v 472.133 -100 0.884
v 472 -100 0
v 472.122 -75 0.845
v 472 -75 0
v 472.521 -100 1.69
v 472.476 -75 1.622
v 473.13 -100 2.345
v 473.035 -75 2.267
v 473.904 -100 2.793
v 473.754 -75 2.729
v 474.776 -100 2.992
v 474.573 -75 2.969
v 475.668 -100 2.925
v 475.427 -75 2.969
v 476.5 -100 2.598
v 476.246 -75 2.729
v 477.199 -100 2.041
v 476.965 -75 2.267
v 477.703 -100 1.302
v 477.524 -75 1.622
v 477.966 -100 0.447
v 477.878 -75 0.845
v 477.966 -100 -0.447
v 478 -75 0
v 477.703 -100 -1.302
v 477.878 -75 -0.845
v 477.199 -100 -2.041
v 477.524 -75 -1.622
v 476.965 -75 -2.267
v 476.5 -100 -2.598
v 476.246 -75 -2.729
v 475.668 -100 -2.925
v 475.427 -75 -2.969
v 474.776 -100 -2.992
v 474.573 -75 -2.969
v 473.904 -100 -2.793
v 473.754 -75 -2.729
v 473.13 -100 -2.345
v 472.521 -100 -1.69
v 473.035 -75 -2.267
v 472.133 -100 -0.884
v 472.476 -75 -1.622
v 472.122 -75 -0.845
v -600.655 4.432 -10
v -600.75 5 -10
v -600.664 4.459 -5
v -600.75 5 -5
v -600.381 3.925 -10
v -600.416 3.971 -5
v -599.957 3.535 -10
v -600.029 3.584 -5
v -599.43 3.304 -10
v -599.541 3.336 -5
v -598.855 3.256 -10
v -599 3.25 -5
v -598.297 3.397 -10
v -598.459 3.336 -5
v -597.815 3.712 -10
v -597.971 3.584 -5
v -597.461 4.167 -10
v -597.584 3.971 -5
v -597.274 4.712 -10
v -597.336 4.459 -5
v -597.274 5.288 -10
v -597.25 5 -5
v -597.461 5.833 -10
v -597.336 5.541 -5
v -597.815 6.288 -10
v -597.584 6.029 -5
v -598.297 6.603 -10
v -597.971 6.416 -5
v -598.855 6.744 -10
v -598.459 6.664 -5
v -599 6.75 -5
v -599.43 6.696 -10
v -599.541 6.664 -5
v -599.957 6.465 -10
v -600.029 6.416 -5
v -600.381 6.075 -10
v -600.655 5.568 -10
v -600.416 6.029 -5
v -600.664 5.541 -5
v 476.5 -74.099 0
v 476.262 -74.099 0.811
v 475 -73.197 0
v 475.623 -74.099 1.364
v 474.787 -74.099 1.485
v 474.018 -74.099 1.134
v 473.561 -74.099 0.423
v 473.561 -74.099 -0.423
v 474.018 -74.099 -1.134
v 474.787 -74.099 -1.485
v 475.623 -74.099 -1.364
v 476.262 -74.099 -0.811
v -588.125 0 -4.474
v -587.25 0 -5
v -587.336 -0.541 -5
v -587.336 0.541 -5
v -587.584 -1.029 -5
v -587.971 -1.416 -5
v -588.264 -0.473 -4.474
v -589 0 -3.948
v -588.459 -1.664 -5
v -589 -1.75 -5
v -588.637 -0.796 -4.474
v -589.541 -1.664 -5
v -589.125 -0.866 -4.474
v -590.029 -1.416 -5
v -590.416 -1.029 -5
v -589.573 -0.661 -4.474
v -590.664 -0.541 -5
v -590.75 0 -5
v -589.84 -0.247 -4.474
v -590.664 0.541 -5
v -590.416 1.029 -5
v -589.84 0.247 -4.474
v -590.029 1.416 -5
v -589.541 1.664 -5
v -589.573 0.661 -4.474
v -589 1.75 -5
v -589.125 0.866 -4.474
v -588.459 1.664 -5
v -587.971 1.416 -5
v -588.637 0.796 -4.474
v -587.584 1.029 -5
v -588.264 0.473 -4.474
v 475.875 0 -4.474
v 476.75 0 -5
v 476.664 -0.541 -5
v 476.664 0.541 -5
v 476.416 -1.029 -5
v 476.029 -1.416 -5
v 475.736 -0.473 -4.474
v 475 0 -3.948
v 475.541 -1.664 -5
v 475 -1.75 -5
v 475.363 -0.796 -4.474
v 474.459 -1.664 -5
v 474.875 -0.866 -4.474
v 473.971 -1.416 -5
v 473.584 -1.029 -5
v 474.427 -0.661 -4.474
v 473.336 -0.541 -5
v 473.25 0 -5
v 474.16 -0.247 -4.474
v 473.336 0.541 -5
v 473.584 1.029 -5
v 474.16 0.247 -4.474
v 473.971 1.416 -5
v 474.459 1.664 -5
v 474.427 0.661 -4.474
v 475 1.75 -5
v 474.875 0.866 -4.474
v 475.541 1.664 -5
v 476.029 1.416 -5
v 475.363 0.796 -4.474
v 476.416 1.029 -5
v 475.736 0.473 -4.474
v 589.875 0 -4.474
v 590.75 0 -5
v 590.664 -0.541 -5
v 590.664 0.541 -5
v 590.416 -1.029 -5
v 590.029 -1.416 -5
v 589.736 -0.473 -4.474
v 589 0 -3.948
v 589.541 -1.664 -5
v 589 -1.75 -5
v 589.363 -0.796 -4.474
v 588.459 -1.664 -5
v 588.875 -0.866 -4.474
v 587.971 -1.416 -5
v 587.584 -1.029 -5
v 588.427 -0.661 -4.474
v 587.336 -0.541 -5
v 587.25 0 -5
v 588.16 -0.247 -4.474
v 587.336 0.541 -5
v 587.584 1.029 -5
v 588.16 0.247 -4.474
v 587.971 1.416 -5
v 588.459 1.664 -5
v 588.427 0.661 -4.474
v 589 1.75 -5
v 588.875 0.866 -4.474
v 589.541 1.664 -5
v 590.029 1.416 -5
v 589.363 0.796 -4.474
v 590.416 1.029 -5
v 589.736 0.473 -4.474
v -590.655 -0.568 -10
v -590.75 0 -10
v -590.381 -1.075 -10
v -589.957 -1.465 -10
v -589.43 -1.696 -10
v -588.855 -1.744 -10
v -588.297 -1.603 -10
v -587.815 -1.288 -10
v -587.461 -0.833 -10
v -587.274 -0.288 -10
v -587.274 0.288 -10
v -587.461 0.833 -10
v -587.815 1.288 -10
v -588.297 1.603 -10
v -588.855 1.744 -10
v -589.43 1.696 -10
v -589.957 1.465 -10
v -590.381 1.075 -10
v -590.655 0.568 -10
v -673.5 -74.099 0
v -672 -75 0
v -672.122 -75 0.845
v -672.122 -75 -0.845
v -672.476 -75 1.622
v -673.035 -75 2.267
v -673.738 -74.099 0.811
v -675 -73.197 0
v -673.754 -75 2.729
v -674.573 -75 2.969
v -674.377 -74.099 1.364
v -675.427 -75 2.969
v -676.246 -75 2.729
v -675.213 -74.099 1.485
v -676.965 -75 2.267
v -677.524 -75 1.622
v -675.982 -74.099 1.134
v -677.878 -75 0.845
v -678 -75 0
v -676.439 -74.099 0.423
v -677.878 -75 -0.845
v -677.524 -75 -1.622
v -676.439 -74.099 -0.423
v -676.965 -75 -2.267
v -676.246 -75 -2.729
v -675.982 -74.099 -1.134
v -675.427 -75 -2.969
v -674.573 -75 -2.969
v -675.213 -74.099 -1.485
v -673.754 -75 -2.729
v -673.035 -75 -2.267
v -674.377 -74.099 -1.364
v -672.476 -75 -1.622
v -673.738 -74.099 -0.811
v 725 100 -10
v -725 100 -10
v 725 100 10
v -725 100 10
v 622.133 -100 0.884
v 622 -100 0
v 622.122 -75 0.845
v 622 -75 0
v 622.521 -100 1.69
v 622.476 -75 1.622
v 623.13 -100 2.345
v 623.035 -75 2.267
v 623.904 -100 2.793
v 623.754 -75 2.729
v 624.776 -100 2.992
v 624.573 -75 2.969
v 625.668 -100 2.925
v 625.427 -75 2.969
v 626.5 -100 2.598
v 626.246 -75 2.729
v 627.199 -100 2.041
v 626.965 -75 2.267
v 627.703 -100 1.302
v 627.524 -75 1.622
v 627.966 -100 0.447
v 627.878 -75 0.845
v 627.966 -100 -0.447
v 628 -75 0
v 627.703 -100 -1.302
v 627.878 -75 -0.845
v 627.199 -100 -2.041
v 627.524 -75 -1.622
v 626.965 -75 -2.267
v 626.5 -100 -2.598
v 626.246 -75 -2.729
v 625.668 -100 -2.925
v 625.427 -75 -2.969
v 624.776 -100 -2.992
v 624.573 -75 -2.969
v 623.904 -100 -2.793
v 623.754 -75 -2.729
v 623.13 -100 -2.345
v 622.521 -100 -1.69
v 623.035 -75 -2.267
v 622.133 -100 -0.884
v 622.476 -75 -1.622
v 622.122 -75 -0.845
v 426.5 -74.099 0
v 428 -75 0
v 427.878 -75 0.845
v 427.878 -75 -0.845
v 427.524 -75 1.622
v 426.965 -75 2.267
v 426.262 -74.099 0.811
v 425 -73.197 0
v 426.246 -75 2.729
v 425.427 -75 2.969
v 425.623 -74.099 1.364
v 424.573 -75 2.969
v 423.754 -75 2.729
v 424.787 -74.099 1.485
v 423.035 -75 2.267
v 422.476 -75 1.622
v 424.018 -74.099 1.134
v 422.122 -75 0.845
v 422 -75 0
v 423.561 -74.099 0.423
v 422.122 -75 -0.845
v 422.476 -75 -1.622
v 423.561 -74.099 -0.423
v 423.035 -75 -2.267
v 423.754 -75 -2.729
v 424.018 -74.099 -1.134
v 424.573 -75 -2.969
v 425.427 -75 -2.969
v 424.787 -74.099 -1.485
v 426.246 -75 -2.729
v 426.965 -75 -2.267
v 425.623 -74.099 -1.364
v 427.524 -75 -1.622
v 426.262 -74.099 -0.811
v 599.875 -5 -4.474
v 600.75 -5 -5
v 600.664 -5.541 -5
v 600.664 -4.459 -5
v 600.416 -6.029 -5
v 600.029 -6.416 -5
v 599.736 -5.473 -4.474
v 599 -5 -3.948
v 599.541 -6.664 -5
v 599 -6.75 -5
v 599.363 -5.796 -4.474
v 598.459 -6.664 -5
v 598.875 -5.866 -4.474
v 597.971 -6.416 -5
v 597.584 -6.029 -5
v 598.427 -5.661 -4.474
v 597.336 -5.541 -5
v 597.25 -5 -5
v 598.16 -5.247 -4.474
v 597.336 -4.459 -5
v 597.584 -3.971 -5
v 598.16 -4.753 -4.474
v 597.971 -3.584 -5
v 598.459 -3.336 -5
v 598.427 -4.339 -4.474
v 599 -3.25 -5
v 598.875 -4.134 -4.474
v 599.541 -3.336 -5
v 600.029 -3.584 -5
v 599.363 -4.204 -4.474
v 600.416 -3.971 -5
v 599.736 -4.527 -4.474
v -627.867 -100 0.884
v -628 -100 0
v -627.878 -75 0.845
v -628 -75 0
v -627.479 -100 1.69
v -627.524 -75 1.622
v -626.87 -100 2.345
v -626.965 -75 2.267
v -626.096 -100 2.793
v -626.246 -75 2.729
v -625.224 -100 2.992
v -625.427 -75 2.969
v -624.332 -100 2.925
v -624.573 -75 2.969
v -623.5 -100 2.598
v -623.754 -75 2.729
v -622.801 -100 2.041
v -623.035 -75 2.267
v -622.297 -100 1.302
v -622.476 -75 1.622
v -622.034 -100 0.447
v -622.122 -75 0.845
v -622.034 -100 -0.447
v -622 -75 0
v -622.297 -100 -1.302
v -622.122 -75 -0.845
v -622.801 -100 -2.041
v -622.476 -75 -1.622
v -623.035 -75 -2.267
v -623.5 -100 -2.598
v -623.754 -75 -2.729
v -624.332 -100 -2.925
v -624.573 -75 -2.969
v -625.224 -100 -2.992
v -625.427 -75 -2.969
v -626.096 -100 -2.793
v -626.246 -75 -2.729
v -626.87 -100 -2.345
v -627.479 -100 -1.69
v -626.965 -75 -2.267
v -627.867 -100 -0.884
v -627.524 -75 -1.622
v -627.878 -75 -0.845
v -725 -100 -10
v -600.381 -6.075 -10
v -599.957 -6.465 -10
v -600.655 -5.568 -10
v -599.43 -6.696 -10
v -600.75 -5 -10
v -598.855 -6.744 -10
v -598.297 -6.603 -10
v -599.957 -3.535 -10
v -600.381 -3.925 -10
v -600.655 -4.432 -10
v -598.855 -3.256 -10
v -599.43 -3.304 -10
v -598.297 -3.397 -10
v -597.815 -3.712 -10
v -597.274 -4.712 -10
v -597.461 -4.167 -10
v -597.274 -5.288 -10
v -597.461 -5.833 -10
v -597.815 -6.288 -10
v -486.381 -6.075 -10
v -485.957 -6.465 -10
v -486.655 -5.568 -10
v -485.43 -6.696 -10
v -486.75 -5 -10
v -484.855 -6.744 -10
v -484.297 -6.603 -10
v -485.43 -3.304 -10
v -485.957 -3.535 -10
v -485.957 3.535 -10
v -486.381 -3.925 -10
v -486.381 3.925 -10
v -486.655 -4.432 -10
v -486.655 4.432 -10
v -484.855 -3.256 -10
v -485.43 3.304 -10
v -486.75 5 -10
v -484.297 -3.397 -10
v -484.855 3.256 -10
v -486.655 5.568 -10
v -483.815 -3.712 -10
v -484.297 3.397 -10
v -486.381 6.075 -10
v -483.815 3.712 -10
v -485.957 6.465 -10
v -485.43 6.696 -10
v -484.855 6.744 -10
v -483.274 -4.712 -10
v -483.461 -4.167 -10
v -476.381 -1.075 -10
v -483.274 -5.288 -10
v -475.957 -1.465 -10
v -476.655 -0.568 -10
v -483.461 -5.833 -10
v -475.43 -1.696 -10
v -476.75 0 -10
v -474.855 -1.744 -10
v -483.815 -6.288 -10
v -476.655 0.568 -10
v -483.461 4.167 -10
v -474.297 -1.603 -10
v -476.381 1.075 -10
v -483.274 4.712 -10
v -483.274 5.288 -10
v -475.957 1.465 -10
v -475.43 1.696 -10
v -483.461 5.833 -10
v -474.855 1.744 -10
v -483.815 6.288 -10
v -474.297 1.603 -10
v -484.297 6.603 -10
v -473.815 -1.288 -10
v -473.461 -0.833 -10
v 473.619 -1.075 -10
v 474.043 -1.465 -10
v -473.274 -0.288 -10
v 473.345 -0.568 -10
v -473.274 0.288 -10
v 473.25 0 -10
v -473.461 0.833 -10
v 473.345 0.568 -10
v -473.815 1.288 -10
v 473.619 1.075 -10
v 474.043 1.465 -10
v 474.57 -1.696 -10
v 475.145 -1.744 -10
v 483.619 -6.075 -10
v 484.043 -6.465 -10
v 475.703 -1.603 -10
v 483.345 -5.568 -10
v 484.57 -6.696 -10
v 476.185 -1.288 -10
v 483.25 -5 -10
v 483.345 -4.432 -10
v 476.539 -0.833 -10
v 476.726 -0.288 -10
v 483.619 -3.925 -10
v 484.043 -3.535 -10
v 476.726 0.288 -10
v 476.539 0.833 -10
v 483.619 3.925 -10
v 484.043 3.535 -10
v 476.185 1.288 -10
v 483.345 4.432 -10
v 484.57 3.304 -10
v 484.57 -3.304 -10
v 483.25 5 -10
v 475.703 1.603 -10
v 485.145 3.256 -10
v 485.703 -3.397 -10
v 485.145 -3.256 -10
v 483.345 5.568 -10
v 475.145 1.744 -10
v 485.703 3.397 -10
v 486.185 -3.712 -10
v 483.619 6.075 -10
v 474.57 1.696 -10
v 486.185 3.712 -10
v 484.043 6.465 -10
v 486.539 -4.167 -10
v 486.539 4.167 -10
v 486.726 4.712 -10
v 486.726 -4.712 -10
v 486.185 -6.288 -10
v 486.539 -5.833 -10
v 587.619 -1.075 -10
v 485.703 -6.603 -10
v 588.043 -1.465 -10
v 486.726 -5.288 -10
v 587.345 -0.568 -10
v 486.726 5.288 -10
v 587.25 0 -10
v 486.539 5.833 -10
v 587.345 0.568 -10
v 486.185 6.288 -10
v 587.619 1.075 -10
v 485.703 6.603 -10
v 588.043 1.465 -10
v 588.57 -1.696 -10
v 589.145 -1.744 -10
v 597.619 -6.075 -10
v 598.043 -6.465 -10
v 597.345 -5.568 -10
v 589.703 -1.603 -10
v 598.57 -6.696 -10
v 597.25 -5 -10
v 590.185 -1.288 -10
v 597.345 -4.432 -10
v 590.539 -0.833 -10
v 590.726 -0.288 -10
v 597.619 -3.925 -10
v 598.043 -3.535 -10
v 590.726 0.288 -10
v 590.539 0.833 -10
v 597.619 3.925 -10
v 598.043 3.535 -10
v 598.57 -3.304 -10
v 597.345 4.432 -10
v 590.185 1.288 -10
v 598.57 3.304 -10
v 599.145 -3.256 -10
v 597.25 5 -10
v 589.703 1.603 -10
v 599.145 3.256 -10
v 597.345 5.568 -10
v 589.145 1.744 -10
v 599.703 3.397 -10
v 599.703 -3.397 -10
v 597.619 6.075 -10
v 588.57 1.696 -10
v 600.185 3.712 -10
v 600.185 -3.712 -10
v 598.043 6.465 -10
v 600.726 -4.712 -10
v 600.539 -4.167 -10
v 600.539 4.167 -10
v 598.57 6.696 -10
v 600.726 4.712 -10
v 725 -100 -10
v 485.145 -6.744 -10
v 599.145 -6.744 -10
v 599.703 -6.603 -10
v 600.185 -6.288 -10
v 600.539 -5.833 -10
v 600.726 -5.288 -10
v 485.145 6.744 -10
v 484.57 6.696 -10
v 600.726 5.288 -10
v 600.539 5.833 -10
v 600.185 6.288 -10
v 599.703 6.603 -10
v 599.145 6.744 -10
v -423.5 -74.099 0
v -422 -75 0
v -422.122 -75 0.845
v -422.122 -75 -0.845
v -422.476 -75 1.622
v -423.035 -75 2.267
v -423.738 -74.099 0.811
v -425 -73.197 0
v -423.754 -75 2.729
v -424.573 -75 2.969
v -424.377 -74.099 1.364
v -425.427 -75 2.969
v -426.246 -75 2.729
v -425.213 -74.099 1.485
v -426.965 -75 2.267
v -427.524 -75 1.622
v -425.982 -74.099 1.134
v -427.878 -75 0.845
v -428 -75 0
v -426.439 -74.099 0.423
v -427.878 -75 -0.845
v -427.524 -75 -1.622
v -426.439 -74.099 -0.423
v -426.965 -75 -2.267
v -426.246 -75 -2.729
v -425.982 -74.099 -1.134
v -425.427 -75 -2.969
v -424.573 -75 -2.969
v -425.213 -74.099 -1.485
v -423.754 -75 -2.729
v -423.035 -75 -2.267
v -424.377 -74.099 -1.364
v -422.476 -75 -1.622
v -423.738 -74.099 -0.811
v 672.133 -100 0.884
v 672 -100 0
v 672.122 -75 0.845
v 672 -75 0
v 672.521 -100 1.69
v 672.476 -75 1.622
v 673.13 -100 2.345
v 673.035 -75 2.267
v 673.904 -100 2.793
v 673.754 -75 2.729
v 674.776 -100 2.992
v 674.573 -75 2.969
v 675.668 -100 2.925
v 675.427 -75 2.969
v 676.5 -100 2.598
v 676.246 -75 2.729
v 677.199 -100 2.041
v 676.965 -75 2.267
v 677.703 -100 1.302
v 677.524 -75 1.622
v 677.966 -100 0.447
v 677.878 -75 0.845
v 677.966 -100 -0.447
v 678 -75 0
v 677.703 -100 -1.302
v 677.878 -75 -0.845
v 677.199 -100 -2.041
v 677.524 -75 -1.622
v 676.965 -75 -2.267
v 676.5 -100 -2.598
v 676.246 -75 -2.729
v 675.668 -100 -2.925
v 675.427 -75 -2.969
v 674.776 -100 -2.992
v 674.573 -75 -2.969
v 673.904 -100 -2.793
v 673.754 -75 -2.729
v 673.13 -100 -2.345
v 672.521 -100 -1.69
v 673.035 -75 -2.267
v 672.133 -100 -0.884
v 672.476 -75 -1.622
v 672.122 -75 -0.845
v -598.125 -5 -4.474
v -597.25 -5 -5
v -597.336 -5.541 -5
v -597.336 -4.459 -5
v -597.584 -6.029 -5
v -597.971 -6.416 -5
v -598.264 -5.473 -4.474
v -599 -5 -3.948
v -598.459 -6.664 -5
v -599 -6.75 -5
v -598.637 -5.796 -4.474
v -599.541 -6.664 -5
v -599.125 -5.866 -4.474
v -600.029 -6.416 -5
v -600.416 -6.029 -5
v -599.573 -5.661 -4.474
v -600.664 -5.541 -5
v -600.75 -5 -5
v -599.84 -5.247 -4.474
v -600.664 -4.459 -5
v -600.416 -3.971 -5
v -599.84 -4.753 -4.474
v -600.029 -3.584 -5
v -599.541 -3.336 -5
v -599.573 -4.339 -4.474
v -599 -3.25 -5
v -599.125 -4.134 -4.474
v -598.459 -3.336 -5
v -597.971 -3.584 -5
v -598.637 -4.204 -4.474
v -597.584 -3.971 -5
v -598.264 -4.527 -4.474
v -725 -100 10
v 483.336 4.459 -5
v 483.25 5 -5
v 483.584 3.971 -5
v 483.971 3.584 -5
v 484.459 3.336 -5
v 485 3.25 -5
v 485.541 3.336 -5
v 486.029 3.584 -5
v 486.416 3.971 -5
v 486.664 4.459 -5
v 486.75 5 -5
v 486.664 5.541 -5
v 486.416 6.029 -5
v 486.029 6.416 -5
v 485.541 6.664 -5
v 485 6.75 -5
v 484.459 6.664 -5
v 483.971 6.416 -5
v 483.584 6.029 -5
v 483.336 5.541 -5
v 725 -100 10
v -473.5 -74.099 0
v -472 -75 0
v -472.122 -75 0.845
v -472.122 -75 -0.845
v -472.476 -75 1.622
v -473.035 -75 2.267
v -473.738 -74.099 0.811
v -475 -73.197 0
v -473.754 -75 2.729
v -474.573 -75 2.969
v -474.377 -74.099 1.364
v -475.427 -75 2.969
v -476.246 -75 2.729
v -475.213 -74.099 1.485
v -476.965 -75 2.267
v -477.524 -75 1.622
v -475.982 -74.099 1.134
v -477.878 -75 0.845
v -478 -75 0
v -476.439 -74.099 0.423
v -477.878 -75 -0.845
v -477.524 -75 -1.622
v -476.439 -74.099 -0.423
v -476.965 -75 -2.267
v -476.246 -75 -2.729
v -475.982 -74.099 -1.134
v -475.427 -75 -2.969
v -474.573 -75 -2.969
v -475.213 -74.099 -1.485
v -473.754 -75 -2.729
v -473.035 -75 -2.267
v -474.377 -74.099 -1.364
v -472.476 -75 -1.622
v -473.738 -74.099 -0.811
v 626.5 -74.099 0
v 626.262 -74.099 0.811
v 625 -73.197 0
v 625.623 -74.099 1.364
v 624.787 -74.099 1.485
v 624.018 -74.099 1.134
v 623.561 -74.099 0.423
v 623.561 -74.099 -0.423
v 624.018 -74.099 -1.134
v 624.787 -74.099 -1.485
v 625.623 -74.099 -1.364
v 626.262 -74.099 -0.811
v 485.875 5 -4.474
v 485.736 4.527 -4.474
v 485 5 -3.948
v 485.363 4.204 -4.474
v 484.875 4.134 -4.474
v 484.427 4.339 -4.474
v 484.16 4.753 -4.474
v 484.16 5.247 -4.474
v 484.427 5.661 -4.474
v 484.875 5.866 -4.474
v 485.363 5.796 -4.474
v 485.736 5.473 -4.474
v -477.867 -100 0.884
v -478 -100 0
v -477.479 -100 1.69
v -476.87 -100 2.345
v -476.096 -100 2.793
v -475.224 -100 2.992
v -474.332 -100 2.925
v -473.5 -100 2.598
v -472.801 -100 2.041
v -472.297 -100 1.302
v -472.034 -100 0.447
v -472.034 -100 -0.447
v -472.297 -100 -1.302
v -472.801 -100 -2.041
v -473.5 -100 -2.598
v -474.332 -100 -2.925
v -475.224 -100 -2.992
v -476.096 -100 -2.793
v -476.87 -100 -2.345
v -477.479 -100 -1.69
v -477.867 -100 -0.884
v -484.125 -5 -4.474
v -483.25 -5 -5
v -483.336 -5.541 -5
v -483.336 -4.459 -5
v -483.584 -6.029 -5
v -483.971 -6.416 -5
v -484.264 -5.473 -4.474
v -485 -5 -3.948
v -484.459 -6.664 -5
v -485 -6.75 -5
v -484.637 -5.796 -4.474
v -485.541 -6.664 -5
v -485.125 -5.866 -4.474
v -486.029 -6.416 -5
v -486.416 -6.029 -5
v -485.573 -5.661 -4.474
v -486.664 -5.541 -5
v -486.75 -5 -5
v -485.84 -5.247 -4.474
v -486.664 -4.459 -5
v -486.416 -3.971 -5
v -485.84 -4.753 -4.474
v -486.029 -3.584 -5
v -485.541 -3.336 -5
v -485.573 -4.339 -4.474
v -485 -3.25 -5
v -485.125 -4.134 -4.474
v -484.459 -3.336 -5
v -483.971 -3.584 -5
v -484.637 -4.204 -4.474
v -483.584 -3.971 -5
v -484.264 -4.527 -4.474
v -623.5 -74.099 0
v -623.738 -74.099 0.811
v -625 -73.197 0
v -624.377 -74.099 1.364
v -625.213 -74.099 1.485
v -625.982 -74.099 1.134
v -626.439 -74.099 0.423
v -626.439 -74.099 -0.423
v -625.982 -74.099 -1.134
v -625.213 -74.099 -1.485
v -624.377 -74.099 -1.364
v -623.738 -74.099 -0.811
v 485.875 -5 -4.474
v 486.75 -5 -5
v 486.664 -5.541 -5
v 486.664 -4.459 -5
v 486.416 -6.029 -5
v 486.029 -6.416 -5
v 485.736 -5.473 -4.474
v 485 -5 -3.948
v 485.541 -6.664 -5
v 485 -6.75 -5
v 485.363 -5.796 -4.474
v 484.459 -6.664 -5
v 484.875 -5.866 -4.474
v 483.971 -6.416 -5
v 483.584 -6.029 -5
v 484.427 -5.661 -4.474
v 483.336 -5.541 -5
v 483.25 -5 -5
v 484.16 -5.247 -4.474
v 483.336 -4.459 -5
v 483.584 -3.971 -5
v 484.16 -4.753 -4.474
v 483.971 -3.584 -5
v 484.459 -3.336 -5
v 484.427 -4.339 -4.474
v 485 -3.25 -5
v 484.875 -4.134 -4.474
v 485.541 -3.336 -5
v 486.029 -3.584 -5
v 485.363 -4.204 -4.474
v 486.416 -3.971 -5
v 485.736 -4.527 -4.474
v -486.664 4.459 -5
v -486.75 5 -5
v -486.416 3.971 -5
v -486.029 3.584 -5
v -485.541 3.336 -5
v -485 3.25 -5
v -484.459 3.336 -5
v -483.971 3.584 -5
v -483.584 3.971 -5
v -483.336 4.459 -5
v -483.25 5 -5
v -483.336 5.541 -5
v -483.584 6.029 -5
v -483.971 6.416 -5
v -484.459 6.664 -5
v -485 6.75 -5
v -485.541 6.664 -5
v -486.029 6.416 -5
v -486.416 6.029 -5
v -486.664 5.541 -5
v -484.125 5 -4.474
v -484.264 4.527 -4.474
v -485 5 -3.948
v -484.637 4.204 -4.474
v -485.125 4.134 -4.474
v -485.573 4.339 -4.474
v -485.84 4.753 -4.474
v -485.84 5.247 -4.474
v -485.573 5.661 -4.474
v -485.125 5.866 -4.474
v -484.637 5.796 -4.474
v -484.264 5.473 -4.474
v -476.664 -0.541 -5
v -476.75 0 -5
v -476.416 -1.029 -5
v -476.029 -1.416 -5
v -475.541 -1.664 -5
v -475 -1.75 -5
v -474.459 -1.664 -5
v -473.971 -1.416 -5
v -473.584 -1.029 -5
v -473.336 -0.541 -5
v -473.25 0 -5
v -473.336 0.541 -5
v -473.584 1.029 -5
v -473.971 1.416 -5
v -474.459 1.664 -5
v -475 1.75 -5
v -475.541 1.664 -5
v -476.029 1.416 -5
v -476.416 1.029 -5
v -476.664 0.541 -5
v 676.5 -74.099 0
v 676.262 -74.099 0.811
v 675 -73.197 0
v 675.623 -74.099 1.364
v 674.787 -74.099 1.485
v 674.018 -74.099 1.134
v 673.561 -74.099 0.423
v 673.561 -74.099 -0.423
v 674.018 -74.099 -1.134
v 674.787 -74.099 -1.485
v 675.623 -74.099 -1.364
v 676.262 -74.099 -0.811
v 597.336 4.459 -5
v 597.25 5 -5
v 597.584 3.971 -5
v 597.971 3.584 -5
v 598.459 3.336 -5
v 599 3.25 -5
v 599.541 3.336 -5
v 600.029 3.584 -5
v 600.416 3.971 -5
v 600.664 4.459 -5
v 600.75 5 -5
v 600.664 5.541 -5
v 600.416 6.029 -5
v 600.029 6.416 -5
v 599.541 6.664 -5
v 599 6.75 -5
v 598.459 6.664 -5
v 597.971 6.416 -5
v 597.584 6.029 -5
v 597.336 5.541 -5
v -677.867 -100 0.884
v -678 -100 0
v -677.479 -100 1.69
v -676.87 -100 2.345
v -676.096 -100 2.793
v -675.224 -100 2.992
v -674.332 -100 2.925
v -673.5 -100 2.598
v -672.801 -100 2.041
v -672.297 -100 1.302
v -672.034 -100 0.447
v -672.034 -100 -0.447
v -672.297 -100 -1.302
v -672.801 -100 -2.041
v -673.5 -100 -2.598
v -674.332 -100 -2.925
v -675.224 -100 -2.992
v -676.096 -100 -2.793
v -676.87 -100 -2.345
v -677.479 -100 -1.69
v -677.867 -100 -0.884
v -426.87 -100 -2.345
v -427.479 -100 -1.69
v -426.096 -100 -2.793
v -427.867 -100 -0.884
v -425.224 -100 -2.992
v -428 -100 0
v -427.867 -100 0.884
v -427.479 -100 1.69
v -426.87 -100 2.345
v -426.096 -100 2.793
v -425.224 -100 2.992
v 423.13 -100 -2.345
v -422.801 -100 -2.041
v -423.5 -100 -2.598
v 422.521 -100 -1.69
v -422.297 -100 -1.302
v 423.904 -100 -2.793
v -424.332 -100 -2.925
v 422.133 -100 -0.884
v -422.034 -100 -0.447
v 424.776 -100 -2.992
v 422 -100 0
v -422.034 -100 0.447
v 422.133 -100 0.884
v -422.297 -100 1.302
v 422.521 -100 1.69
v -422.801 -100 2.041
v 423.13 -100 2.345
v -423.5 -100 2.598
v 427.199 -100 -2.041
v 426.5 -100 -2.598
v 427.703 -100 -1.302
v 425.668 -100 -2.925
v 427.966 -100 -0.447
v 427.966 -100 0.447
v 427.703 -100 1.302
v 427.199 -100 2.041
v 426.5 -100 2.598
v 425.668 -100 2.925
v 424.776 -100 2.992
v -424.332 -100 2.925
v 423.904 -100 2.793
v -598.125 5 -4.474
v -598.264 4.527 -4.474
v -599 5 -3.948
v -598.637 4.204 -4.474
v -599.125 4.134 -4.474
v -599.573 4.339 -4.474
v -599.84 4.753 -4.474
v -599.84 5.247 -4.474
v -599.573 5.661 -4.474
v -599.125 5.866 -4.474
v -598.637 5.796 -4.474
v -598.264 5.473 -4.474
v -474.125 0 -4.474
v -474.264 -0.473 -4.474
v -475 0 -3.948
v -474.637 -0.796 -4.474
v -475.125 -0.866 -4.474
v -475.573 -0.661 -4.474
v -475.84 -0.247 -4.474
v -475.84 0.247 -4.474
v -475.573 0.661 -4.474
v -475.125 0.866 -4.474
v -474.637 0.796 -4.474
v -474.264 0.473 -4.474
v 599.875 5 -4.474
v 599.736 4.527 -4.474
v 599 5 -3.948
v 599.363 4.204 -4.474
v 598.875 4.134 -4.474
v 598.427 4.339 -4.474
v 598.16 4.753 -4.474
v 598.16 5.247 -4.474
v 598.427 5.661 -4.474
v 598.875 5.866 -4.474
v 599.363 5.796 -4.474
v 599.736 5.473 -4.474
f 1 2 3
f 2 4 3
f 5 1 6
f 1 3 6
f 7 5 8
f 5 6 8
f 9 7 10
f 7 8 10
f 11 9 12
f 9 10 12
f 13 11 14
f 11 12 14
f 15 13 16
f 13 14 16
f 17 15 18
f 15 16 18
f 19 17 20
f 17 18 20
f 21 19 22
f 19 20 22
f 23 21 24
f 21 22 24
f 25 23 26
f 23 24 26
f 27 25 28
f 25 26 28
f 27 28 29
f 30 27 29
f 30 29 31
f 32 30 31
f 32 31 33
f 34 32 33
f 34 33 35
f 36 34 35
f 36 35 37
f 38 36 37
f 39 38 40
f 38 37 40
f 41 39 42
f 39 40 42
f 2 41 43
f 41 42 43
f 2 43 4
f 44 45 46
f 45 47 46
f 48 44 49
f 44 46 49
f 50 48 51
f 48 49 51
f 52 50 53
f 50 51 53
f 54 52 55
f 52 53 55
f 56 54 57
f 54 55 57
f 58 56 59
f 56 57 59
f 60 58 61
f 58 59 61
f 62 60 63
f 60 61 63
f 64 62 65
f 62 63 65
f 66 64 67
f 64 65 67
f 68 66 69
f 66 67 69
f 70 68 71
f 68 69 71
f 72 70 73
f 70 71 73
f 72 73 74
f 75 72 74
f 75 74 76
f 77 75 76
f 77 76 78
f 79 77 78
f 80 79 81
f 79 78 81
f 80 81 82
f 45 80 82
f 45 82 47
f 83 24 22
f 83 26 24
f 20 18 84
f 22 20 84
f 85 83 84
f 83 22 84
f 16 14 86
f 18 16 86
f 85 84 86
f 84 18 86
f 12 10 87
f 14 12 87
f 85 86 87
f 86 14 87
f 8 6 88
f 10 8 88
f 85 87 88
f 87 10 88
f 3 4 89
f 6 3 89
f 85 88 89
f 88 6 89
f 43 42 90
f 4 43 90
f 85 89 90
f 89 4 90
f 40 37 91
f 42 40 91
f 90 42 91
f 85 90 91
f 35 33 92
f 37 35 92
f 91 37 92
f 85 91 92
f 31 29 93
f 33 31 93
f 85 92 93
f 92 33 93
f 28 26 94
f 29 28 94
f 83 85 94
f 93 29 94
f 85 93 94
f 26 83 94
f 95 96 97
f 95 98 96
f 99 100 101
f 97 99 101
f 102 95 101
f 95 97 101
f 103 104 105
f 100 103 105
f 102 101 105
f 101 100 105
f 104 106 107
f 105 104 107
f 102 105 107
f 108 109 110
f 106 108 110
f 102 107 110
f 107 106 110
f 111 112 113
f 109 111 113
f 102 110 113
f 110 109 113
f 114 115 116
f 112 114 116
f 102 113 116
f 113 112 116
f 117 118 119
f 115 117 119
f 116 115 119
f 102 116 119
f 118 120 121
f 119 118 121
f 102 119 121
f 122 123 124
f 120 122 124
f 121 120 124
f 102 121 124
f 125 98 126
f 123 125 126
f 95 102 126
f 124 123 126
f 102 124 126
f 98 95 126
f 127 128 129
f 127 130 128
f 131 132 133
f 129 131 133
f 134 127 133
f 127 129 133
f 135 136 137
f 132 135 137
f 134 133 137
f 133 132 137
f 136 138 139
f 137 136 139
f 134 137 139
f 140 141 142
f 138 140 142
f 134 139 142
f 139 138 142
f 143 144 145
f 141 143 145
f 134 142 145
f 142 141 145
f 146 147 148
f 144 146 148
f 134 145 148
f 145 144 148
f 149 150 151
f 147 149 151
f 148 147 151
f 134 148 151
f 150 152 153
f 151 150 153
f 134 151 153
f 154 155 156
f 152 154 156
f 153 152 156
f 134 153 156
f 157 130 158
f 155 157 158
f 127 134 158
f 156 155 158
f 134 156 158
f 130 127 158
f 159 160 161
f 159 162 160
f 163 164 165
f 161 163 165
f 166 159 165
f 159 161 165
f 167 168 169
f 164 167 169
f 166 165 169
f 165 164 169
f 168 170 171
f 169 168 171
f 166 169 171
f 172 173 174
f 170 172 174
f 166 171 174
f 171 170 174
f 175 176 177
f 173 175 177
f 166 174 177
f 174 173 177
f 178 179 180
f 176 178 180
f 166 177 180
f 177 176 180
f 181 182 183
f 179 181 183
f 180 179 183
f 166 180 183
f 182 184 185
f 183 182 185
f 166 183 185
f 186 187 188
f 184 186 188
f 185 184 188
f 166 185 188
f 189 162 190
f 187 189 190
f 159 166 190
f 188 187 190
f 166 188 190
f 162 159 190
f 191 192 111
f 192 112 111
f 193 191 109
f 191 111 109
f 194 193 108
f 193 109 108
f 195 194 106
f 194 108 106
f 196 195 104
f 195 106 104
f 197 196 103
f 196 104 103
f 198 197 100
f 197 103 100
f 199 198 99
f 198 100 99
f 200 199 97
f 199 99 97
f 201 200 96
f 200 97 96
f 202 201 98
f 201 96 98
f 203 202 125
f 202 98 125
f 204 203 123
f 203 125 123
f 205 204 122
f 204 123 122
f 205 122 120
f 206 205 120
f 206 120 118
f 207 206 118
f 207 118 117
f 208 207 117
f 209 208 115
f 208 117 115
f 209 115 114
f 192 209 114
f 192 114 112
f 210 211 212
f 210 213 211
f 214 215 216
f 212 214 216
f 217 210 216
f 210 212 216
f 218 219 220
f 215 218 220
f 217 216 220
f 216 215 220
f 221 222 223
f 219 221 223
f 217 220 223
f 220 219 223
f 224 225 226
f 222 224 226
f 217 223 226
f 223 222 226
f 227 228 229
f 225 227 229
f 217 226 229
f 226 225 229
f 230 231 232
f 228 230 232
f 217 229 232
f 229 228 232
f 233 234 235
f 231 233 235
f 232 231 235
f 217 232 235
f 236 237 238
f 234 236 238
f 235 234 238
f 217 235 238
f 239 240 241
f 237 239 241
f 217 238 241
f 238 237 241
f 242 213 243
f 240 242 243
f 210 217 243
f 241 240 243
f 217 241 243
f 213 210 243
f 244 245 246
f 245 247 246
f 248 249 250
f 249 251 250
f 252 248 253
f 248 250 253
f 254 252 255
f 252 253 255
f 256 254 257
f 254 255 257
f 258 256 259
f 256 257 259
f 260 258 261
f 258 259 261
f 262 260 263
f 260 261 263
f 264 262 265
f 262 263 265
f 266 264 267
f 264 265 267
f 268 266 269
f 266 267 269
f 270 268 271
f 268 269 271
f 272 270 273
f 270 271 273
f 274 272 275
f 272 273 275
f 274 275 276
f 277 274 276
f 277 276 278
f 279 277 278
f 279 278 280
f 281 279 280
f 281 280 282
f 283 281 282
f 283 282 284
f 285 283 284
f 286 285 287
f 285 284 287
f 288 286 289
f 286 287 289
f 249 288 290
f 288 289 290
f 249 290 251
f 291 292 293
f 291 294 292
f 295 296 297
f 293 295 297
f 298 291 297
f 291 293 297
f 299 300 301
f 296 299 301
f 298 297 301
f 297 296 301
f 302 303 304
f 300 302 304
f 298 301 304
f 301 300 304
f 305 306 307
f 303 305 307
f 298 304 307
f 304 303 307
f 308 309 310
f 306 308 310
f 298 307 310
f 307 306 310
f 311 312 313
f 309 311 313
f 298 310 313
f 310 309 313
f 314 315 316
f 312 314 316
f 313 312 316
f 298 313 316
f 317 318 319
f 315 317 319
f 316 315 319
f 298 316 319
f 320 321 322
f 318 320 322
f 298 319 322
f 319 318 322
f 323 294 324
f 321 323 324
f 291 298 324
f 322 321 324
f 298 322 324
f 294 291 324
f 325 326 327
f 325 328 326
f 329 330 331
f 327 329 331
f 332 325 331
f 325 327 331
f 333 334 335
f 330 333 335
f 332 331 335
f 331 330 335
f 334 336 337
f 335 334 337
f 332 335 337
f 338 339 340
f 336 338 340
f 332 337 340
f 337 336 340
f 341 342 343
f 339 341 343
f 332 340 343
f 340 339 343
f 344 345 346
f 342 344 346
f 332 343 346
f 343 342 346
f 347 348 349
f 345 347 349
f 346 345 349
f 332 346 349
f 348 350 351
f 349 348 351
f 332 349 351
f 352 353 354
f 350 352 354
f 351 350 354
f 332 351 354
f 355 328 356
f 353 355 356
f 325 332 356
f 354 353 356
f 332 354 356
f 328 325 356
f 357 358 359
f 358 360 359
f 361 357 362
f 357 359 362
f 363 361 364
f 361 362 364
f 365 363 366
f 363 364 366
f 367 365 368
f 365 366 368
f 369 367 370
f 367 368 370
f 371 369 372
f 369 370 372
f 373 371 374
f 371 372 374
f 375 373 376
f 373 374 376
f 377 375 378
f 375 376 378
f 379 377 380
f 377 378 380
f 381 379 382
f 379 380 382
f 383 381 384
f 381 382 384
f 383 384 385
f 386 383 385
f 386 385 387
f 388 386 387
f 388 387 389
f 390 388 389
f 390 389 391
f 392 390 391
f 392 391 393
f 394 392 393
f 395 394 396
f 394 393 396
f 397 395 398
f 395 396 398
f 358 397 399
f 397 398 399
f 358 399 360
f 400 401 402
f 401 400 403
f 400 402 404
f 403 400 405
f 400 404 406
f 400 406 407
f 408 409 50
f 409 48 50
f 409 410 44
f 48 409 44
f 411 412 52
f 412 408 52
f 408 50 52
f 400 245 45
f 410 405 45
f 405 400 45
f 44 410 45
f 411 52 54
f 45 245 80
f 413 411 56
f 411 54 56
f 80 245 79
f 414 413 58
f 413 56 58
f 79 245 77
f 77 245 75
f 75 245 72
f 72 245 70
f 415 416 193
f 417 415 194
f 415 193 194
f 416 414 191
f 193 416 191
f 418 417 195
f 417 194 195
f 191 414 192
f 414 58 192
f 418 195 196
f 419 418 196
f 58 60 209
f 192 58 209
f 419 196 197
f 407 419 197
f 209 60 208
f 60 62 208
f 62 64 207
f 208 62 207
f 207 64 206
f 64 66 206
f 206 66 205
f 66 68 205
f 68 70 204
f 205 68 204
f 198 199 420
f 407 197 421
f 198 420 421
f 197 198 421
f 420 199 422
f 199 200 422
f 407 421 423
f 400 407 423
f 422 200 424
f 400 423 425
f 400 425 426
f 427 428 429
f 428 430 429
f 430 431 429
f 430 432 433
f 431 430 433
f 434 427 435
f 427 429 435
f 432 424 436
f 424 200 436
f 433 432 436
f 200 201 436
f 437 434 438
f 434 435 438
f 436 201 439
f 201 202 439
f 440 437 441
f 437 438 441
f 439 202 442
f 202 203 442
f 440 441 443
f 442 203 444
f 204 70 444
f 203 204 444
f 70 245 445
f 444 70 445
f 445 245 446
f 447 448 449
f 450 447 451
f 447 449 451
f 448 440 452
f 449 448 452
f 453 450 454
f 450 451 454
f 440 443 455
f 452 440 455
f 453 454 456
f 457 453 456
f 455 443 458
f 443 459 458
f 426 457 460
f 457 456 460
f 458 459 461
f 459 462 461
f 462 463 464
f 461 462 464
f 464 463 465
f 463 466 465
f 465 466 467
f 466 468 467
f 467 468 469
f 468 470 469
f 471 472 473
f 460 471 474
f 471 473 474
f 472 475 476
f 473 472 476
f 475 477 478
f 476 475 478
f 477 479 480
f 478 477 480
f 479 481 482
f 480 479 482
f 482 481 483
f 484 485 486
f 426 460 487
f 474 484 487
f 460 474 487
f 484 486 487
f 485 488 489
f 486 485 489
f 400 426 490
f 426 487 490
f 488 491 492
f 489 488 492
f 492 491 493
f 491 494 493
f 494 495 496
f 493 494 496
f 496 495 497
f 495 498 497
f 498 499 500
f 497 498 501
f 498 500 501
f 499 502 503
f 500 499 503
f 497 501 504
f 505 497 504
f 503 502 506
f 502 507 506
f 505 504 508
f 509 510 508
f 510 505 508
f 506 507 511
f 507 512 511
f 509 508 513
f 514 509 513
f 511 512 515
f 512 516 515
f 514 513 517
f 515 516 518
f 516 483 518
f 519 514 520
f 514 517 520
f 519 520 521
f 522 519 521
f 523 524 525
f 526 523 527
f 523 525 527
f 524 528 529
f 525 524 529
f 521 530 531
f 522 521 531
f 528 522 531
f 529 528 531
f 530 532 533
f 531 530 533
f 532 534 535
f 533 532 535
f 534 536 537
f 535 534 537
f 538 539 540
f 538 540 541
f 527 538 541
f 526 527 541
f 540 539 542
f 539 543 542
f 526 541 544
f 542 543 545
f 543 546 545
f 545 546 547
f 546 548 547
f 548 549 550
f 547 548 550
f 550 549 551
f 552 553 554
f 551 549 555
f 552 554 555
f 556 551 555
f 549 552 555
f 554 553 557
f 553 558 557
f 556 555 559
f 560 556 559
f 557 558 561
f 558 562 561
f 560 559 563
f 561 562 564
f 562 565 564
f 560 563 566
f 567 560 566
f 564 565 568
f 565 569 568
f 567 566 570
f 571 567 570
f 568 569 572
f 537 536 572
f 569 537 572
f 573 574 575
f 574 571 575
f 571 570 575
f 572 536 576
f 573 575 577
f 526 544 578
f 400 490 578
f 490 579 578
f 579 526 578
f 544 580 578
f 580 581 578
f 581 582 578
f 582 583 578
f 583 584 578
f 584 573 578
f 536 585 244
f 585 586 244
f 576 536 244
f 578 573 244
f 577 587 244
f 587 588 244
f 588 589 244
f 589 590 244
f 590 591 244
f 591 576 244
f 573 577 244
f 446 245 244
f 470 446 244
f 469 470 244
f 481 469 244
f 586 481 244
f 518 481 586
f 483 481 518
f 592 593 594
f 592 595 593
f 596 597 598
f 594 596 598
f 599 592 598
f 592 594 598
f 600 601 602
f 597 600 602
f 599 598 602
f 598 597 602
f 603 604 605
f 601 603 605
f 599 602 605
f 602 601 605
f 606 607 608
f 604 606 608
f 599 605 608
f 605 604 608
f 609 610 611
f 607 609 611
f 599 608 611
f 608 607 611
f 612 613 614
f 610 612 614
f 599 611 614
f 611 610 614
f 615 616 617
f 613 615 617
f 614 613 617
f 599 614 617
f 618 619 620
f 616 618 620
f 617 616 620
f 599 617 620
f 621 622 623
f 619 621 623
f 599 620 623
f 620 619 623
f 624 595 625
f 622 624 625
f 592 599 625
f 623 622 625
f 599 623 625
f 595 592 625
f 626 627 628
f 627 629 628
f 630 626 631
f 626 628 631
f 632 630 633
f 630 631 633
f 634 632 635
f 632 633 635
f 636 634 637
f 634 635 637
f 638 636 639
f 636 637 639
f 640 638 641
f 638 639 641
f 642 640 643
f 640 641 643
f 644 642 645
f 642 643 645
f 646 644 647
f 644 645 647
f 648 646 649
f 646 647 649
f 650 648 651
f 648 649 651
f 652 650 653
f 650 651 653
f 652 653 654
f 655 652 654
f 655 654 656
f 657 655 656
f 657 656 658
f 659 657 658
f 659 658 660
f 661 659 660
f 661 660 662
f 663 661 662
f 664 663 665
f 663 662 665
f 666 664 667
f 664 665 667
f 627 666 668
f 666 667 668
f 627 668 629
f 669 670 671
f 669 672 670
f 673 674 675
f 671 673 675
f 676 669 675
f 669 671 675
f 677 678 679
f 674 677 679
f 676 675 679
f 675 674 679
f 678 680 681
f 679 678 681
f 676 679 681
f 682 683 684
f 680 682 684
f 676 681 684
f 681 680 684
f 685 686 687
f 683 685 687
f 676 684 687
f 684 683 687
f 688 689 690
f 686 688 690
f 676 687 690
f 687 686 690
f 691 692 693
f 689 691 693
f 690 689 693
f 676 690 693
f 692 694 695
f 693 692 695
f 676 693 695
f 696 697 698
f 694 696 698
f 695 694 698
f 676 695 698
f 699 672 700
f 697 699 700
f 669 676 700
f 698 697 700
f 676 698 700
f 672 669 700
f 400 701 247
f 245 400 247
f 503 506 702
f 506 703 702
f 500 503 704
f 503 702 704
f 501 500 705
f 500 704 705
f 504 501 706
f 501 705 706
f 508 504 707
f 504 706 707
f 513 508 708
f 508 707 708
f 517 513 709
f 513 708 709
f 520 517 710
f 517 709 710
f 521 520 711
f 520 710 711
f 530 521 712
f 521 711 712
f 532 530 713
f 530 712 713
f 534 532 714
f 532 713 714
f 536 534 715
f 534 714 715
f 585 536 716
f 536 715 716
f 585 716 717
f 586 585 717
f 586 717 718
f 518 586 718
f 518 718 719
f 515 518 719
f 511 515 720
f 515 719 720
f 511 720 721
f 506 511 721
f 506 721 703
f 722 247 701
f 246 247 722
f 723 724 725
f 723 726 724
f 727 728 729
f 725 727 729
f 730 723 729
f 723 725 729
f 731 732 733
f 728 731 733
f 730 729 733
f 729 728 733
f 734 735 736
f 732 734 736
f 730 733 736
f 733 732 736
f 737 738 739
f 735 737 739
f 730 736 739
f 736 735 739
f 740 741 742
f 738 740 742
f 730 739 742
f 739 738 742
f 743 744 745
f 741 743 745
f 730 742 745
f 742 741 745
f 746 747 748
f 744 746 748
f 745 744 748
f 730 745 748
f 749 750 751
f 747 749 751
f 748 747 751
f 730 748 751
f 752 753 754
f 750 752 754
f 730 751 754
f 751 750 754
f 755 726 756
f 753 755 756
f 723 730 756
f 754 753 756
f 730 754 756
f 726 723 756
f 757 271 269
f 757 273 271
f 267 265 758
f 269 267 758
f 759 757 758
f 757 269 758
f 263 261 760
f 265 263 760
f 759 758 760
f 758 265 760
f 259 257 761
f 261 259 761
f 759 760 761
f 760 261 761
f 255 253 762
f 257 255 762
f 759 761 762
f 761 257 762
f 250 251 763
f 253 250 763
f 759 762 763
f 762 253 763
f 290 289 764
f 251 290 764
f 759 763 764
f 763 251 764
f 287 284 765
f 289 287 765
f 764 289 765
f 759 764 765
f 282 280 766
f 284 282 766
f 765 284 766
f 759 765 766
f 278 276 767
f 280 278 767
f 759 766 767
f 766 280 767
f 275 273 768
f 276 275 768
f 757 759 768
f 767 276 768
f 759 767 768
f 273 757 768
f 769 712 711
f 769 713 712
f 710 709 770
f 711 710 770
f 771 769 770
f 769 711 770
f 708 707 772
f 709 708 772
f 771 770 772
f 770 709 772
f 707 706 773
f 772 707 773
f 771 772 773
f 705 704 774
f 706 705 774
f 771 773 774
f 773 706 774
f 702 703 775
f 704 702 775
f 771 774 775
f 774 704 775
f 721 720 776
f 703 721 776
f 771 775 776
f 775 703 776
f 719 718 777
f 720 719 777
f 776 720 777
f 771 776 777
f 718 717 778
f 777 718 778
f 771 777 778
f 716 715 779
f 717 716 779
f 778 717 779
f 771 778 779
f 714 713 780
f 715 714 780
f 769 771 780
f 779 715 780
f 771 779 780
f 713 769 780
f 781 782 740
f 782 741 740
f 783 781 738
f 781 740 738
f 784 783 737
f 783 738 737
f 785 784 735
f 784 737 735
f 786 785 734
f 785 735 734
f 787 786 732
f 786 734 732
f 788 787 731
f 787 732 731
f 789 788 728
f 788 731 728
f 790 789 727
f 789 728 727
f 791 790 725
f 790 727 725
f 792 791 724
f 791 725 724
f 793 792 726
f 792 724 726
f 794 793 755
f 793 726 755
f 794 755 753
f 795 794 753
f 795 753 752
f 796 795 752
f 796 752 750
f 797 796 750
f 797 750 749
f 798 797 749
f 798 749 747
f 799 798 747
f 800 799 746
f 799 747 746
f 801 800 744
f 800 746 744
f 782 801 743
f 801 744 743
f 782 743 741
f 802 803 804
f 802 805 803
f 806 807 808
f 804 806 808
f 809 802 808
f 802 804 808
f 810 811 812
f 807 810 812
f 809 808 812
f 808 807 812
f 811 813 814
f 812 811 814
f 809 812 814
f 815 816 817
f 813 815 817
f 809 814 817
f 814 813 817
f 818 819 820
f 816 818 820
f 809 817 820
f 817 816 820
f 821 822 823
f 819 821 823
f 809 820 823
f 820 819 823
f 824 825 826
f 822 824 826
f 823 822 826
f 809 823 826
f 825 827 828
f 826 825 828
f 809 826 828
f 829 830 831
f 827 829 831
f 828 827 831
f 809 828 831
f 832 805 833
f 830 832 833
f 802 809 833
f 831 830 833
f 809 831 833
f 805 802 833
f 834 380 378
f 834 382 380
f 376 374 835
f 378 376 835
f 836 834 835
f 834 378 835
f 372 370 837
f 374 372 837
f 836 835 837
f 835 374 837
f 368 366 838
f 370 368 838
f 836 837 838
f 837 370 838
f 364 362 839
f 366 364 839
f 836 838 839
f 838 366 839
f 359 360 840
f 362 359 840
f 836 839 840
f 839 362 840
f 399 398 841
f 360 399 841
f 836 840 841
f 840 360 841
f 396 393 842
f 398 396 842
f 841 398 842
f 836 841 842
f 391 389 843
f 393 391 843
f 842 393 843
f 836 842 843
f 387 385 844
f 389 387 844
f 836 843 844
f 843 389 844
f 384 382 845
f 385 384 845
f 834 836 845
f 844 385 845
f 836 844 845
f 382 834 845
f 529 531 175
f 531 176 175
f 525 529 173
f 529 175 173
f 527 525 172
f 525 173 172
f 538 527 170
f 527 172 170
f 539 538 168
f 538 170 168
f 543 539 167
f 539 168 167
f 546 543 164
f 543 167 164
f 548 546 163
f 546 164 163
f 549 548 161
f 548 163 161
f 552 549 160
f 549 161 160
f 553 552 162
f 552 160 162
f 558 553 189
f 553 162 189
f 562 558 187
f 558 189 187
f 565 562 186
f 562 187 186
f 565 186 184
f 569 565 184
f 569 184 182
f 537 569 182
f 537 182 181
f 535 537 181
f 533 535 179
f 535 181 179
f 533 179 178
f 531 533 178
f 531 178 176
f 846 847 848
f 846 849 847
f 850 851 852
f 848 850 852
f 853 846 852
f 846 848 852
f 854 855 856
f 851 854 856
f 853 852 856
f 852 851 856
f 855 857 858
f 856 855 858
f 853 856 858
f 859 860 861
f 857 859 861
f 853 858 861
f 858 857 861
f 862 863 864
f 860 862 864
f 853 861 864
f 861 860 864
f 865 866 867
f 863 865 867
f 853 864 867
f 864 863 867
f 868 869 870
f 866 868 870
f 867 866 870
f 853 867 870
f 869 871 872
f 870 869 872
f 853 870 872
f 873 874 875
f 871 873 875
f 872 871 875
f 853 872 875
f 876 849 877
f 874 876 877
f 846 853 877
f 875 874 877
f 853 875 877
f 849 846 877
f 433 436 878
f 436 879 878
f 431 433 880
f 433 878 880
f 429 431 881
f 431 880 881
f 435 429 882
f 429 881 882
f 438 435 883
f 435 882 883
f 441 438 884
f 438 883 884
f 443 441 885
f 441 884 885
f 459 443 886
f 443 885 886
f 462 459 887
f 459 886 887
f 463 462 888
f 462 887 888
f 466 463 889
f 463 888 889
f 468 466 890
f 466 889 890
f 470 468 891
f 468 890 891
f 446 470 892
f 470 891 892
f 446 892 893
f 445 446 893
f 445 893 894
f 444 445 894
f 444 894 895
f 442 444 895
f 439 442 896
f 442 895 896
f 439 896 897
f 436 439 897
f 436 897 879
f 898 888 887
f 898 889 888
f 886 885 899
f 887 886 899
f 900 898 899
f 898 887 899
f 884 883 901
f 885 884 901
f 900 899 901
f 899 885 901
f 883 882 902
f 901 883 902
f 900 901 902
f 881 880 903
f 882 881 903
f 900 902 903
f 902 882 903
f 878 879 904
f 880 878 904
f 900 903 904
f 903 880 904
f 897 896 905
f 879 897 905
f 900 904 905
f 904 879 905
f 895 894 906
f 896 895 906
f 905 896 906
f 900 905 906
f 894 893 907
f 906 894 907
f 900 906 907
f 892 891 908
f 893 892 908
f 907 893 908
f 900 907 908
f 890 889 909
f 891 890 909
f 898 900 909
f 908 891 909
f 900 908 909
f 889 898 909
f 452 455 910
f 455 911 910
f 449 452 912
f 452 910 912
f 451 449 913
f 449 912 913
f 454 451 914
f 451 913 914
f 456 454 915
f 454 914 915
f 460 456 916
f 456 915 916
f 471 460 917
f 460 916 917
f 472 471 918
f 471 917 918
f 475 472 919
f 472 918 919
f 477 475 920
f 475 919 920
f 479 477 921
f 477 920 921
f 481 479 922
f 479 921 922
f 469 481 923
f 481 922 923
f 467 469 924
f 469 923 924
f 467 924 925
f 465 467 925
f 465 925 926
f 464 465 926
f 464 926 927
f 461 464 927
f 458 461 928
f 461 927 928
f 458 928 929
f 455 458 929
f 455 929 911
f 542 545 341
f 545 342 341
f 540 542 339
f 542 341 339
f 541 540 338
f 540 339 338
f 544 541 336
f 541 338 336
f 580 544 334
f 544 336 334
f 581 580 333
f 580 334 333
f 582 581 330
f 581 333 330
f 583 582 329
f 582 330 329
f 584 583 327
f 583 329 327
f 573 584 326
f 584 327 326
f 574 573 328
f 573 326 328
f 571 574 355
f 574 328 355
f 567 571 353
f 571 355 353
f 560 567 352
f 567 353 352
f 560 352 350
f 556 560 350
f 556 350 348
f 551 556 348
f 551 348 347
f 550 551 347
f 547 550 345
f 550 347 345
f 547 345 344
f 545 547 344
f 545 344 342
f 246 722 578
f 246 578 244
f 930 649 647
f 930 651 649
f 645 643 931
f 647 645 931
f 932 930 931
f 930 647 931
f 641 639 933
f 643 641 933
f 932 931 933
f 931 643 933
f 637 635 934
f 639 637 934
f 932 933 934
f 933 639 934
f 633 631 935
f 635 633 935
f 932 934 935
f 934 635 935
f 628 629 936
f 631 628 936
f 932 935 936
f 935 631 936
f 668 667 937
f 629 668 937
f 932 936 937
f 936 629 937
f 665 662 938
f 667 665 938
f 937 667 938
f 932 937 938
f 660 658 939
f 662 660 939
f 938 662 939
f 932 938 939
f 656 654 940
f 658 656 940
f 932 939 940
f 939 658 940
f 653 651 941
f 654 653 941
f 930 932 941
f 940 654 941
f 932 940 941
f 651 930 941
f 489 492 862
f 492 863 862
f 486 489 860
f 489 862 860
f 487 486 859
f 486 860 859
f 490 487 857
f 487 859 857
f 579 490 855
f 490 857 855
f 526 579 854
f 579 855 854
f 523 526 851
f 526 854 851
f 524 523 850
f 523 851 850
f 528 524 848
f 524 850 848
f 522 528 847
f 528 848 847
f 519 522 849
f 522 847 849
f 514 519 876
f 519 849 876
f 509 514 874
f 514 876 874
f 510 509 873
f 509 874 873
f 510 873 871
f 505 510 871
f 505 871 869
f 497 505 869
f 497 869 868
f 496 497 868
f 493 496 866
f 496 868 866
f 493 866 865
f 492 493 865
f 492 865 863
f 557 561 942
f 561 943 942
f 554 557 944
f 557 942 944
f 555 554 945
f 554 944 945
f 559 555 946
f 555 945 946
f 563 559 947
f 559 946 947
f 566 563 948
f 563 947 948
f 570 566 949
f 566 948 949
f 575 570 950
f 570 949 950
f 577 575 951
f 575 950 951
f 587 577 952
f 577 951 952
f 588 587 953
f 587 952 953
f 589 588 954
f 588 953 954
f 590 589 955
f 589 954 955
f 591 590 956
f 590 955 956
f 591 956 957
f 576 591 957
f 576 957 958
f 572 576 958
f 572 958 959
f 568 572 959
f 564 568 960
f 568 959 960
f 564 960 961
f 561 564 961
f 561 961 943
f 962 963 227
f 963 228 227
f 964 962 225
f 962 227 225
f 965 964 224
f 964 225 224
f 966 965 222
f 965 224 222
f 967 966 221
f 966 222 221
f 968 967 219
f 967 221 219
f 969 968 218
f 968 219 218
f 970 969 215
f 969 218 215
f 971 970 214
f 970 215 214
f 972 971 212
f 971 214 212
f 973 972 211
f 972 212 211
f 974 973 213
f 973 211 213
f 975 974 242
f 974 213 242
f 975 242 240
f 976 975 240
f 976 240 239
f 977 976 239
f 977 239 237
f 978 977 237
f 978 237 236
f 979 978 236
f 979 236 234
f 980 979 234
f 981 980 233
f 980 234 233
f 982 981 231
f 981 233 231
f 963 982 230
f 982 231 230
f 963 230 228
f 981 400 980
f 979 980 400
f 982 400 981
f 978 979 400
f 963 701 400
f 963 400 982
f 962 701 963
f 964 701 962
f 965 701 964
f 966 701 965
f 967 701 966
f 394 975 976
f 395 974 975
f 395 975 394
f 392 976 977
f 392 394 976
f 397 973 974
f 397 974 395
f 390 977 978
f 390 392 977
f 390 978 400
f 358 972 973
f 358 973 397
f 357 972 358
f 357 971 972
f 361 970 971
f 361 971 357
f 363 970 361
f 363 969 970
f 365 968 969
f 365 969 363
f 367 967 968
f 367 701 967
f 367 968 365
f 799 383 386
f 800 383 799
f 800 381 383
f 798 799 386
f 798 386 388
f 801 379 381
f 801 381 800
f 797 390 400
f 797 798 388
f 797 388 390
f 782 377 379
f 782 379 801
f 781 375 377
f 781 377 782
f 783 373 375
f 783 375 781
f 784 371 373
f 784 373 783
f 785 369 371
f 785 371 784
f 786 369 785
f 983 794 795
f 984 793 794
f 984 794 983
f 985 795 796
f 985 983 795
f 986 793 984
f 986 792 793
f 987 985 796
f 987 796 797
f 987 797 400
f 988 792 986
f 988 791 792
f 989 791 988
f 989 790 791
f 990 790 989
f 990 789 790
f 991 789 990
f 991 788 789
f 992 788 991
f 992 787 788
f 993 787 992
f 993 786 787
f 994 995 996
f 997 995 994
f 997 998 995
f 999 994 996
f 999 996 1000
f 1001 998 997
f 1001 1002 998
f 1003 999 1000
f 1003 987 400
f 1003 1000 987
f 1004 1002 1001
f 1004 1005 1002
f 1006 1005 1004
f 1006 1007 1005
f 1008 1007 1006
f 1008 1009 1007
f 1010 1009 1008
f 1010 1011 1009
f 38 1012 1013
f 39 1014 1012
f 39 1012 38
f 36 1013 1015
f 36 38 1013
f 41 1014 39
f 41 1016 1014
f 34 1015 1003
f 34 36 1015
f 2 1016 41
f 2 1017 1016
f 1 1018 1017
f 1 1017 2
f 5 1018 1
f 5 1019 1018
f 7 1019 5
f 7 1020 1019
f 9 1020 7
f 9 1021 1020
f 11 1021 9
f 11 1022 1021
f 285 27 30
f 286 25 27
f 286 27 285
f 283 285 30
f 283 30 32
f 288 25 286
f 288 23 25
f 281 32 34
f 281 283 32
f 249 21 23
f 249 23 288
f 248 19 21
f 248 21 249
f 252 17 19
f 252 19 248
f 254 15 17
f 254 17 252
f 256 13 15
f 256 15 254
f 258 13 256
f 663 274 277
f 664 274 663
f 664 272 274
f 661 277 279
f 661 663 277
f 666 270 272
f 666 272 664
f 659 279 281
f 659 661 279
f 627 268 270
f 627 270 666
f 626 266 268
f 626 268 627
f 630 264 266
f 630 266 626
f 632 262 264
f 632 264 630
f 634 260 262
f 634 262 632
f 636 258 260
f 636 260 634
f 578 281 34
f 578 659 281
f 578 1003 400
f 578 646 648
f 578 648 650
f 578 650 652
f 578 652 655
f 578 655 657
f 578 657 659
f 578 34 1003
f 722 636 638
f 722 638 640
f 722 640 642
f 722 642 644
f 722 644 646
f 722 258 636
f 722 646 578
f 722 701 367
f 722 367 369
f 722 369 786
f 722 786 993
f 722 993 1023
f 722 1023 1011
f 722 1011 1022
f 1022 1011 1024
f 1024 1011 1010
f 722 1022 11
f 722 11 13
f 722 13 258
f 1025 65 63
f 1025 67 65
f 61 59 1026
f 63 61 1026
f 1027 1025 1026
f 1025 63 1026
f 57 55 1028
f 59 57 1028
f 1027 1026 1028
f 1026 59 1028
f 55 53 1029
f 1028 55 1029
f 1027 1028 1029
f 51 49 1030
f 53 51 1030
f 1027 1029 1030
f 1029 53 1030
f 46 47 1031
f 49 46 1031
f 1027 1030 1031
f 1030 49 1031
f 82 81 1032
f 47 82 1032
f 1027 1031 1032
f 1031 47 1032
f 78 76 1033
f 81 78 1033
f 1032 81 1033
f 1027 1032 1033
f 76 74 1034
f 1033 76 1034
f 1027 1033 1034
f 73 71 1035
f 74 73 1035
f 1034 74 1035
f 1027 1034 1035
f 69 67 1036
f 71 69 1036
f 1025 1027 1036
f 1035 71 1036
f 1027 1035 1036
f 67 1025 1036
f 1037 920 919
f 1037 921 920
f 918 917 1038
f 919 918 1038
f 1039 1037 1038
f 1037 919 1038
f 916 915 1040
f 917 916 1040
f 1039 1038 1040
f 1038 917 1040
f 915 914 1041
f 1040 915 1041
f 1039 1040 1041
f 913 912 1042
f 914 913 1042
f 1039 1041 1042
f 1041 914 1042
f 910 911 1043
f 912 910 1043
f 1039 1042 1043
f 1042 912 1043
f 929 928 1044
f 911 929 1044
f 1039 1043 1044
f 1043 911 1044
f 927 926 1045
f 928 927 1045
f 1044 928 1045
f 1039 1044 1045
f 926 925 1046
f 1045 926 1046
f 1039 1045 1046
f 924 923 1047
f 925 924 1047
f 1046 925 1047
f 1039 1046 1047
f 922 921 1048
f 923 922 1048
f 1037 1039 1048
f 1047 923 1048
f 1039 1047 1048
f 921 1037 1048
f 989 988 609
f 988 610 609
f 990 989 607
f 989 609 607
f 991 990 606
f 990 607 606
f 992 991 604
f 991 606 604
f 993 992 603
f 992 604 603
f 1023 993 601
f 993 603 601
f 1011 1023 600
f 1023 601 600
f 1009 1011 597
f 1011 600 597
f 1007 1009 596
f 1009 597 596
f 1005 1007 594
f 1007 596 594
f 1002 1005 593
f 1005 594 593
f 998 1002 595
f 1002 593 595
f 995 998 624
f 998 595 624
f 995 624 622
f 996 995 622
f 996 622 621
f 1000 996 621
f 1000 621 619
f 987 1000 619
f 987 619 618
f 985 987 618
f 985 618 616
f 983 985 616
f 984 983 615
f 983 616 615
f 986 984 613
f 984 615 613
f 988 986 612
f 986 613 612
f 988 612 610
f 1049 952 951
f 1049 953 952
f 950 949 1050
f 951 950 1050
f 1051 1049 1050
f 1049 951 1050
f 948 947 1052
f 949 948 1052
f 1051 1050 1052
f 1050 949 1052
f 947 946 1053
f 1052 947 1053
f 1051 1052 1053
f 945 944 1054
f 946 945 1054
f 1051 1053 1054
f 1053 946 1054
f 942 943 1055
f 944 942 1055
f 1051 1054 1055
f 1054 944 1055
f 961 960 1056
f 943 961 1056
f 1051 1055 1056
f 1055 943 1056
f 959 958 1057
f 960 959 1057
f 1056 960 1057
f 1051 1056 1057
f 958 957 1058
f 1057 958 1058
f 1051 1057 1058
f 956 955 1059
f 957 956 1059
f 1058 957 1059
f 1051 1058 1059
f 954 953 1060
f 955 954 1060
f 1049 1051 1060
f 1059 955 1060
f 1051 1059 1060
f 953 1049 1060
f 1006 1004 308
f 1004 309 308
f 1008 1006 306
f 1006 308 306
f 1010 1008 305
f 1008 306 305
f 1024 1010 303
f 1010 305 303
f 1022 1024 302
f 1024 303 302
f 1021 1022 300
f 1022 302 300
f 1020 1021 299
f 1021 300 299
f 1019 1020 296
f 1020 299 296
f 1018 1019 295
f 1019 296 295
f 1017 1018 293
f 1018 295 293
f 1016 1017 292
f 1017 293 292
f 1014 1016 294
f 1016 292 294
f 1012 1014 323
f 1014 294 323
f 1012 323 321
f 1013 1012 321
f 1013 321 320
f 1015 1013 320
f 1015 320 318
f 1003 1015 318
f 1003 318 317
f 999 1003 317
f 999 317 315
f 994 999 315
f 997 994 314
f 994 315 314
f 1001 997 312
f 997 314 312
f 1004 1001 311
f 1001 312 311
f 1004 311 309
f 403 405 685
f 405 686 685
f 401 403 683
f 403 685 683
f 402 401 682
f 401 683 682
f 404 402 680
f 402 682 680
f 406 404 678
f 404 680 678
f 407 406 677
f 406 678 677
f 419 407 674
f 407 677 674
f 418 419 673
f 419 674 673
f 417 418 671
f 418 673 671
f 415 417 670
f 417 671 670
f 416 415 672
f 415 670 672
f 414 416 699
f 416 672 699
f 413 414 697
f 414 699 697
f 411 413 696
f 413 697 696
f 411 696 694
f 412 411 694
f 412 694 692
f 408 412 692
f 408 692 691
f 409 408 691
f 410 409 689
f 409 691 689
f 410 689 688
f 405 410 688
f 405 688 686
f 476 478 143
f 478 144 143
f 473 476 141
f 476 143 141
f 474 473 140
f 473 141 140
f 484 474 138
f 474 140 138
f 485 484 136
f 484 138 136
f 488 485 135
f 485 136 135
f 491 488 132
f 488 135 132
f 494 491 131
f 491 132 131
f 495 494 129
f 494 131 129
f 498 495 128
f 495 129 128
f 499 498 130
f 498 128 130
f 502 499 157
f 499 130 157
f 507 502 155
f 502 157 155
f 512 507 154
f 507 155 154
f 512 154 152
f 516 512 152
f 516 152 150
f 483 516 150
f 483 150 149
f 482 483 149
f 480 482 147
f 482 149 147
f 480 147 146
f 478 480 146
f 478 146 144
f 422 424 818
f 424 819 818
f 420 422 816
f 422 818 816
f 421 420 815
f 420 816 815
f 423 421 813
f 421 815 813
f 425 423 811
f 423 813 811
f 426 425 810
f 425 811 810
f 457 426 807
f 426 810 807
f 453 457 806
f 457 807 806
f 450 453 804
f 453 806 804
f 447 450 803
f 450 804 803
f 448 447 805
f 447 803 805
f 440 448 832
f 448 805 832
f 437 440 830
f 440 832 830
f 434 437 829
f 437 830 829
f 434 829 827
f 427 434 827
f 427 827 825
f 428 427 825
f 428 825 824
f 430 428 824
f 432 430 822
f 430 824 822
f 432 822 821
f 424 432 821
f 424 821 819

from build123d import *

# Parameters (mm, degrees)
F0_W     = 1450
F0_H     = 200
F1_DEPTH = 10
F3_D     = 6
F3_DEPTH = 25
F3_TIP   = 1.8025818571
F5_D     = 3.5
F5_DEPTH = 5
F5_TIP   = 1.0515060833
F6_D     = 3.5
F6_DEPTH = 5
F6_TIP   = 1.0515060833


with BuildPart() as f1:
    # F0 (on Top) → F1 (new body, symmetric)
    with BuildSketch(Plane.XY):
        Rectangle(F0_W, F0_H)
    extrude(amount=F1_DEPTH, both=True)

    # F3
    with Locations(Plane.XZ.offset(100)):
        with Locations((-675, 0), (-625, 0), (-475, 0), (-425, 0), (425, 0), (475, 0), (625, 0), (675, 0)):
            Hole(F3_D / 2, depth=F3_DEPTH)
            with Locations((0, 0, -(F3_DEPTH + F3_TIP / 2))):  # 118° drill point
                Cone(0, F3_D / 2, F3_TIP, mode=Mode.SUBTRACT)

    # F5
    with Locations(Plane(origin=(0, 0, -10), x_dir=(1, 0, 0), z_dir=(0, 0, -1))):
        with Locations((-599, 5), (-599, -5), (-589, 0), (-485, 5), (-485, -5), (-475, 0)):
            Hole(F5_D / 2, depth=F5_DEPTH)
            with Locations((0, 0, -(F5_DEPTH + F5_TIP / 2))):  # 118° drill point
                Cone(0, F5_D / 2, F5_TIP, mode=Mode.SUBTRACT)

    # F6
    with Locations(Plane(origin=(0, 0, -10), x_dir=(1, 0, 0), z_dir=(0, 0, -1))):
        with Locations((475, 0), (485, -5), (485, 5), (589, 0), (599, 5), (599, -5)):
            Hole(F6_D / 2, depth=F6_DEPTH)
            with Locations((0, 0, -(F6_DEPTH + F6_TIP / 2))):  # 118° drill point
                Cone(0, F6_D / 2, F6_TIP, mode=Mode.SUBTRACT)


solid = f1.part
